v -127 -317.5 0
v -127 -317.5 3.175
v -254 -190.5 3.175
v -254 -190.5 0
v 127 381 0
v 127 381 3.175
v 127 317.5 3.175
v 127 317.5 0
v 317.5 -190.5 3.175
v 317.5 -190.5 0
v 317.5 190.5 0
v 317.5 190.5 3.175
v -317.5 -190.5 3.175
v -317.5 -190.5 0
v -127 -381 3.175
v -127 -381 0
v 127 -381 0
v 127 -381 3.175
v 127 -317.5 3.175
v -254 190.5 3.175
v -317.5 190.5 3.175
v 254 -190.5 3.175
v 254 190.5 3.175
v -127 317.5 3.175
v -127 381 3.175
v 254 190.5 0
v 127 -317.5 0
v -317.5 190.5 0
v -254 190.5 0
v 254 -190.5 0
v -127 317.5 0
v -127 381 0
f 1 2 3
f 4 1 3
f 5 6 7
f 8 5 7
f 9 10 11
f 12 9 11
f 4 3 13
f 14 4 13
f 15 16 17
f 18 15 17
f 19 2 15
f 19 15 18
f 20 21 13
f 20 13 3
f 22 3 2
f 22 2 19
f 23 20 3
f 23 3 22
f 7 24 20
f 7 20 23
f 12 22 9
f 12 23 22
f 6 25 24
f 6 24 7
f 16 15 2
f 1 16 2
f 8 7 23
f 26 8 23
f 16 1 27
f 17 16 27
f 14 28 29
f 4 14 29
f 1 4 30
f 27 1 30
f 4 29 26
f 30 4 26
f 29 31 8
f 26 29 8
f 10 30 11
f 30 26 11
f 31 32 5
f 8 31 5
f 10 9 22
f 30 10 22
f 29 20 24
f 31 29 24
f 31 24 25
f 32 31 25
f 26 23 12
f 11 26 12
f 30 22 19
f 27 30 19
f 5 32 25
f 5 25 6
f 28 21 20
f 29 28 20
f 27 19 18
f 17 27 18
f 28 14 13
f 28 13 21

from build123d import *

# Parameters (mm, degrees)
SKETCH1_W           = 635
SKETCH1_H           = 762
BOSS_EXTRUDE1_DEPTH = 3.175
SKETCH3_W           = 901.746898996
SKETCH3_H           = 1073.20581641
CUT_EXTRUDE1_DEPTH  = 496.961017243


with BuildPart() as part:
    # Sketch1 → Boss-Extrude1 (new body)
    with BuildSketch(Plane.XY):
        Rectangle(SKETCH1_W, SKETCH1_H)
    extrude(amount=BOSS_EXTRUDE1_DEPTH)

    # Sketch3 → Cut-Extrude1 (cut, through all)
    with BuildSketch(Plane.XY.offset(3.175)):
        with Locations((-17.044225779, -39.145238765)):
            Rectangle(SKETCH3_W, SKETCH3_H)
        Polygon((-127, 381), (127, 381), (127, 317.5), (254, 190.5), (317.5, 190.5), (317.5, -190.5), (254, -190.5), (127, -317.5), (127, -381), (-127, -381), (-127, -317.5), (-254, -190.5), (-317.5, -190.5), (-317.5, 190.5), (-254, 190.5), (-127, 317.5), align=None, mode=Mode.SUBTRACT)
    extrude(amount=-CUT_EXTRUDE1_DEPTH, mode=Mode.SUBTRACT)


solid = part.part
